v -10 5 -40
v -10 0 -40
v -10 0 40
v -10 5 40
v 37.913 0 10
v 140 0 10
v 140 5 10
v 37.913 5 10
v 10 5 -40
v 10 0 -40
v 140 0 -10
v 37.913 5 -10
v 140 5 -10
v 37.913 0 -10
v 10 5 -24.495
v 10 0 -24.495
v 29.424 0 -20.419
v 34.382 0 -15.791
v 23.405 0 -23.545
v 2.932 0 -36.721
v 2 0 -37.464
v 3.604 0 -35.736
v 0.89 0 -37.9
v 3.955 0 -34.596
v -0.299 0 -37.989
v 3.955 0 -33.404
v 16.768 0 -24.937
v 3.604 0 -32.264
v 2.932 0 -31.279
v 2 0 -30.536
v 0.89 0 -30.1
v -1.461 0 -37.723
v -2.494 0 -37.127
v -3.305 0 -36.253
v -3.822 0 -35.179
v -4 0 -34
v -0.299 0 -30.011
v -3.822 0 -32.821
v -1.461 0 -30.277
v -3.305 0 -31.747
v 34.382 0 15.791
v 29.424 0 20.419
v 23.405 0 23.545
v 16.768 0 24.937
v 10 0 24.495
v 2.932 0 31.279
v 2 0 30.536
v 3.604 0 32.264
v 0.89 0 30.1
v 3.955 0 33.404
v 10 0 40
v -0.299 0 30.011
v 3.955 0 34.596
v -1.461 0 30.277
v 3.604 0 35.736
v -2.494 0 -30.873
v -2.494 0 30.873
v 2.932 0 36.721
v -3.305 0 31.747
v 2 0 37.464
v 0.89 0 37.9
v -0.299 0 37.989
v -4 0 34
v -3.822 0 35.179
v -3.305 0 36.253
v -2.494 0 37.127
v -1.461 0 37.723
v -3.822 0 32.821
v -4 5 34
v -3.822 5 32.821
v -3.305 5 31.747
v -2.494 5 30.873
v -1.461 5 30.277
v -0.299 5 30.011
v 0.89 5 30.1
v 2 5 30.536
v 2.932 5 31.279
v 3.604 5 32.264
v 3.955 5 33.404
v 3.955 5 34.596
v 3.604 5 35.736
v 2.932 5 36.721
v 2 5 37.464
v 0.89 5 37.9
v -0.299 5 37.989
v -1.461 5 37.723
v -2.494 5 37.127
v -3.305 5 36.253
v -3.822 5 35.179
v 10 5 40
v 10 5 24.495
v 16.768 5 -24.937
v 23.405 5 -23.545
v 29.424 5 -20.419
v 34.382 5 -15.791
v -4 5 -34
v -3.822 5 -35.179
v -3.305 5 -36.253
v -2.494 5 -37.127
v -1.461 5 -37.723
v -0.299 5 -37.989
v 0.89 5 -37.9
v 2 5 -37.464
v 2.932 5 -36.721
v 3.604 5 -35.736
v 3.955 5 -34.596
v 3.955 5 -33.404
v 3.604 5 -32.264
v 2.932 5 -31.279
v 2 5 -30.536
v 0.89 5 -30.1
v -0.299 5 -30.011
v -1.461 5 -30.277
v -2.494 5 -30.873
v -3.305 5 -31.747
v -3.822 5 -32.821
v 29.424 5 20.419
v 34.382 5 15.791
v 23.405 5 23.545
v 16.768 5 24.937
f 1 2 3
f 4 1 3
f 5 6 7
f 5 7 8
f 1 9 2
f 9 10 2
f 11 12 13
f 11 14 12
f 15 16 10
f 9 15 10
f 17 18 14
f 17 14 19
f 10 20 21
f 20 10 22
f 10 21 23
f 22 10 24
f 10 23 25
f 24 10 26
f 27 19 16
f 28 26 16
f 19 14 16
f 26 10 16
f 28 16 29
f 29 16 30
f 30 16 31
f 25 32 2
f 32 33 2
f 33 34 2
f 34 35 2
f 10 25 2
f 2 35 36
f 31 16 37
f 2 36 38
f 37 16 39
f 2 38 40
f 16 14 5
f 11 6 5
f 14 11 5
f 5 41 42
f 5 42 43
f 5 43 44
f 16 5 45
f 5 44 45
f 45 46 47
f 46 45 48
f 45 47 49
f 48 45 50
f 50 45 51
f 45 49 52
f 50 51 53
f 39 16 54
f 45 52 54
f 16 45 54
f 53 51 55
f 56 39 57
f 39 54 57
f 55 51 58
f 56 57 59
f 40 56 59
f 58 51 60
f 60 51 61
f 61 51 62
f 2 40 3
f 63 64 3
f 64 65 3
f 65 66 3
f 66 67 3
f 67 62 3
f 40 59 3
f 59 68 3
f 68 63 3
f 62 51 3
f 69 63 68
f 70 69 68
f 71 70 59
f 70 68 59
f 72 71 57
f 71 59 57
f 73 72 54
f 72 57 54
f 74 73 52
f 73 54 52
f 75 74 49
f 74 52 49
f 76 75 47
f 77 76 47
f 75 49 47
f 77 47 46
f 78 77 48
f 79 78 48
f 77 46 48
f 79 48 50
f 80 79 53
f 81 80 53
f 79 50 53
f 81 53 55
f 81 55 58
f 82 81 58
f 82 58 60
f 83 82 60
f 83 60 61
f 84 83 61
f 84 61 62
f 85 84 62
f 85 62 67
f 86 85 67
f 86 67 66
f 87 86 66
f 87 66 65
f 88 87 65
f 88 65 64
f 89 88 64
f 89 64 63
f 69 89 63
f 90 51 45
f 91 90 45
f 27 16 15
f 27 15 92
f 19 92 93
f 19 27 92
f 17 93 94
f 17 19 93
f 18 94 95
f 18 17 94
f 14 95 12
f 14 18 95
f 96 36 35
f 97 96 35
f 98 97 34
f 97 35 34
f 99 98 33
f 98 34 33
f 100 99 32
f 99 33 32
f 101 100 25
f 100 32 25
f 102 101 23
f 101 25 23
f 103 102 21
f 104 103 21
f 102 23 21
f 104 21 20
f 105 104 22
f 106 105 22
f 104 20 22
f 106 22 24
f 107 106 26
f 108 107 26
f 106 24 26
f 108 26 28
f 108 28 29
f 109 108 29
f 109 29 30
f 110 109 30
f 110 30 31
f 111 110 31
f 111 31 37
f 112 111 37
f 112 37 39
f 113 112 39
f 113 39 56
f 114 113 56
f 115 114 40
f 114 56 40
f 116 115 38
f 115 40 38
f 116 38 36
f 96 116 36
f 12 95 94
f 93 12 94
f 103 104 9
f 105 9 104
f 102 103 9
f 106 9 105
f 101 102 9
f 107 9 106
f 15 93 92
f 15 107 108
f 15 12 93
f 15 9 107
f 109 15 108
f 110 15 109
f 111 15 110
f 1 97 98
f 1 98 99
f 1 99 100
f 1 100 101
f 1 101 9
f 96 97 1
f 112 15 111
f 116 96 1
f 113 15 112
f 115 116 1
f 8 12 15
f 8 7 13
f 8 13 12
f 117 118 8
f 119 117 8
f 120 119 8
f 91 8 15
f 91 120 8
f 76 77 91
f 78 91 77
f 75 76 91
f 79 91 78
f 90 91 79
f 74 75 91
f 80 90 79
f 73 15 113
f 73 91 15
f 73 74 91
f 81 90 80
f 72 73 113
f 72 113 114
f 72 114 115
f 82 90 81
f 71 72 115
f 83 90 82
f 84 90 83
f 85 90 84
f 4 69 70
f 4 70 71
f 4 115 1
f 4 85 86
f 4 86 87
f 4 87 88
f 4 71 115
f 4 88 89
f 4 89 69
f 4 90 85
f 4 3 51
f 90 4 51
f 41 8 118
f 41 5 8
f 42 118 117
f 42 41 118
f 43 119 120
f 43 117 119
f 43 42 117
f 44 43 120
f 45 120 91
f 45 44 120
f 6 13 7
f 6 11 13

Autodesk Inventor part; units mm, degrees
ref_plane "YZ Plane" through (0, 0, 0) normal (1, 0, 0) x (0, 1, 0)
ref_plane "XZ Plane" through (0, 0, 0) normal (0, 1, 0) x (-1, 0, 0)
ref_plane "XY Plane" through (0, 0, 0) normal (0, 0, 1) x (1, 0, 0)
sketch "Sketch1" plane through (0, 0, 0) normal (0, 1, 0) x (-1, 0, 0)
  line L0 (-140, 10) -> (-10, 10)
  line L1 (-10, 10) -> (-10, -10)
  line L2 (-10, -10) -> (-140, -10)
  line L3 (-140, -10) -> (-140, 10)
  line L4 (-140, 10) -> (-10, -10) construction
  line L5 (-10, 10) -> (-140, -10) construction
  line L6 (10, 40) -> (-10, 40)
  line L7 (-10, 40) -> (-10, -40)
  line L8 (-10, -40) -> (10, -40)
  line L9 (10, -40) -> (10, 40)
  line L10 (10, 40) -> (-10, -40) construction
  line L11 (-10, 40) -> (10, -40) construction
  line L12 (40, 0) -> (-170, 0) projected
  line L13 (0, -56) -> (0, 56) projected
  circle A0 centre (-15, 0) radius 25
  circle A1 centre (0, 34) radius 4
  circle A2 centre (0, -34) radius 4
  point P0 (0, 0)
  point P1 (-75, 0)
  point P2 (0, 0)
  point P3 (-75, 0)
  point P4 (0, 0)
  point P5 (0, 0)
  point P6 (-37.9129, -10)
  point P7 (-10, -24.4949)
  point P8 (-10, 24.4949)
  point P9 (-37.9129, 10)
  dimension "d0" = 20
  dimension "d1" = 20
  dimension "d2" = 80
  dimension "d3" = 150
  dimension "d5" = 50
  dimension "d6" = 15
  dimension "d7" = 8
  dimension "d8" = 6
  dimension "d9" = 8
  dimension "d10" = 6
extrude "Extrusion1" add sketch "Sketch1" along normal blind 5 contours L0 A0 L12 L3 | A0 L7 L0 | L0 L1 L12 A0 | L12 A0 L2 L3 | L7 A0 L13 L12 L1 | L7 L6 L13 A1 A0 | L12 L1 L2 A0 | L12 L13 A0 L7 L1 | A0 L12 L13 | L13 A1 L6 L9 A0 | L2 L7 A0 | L12 A0 L13 | L9 L8 L13 A2 A0 | A0 L13 A2 L8 L7
equation "\"d0\" = AnEsl"
equation "\"d1\" = AnEsl"
equation "\"d9\" = d7"
equation "\"d10\" = d8"
equation "\"AnEsl\" = 20"
properties part number "T"
